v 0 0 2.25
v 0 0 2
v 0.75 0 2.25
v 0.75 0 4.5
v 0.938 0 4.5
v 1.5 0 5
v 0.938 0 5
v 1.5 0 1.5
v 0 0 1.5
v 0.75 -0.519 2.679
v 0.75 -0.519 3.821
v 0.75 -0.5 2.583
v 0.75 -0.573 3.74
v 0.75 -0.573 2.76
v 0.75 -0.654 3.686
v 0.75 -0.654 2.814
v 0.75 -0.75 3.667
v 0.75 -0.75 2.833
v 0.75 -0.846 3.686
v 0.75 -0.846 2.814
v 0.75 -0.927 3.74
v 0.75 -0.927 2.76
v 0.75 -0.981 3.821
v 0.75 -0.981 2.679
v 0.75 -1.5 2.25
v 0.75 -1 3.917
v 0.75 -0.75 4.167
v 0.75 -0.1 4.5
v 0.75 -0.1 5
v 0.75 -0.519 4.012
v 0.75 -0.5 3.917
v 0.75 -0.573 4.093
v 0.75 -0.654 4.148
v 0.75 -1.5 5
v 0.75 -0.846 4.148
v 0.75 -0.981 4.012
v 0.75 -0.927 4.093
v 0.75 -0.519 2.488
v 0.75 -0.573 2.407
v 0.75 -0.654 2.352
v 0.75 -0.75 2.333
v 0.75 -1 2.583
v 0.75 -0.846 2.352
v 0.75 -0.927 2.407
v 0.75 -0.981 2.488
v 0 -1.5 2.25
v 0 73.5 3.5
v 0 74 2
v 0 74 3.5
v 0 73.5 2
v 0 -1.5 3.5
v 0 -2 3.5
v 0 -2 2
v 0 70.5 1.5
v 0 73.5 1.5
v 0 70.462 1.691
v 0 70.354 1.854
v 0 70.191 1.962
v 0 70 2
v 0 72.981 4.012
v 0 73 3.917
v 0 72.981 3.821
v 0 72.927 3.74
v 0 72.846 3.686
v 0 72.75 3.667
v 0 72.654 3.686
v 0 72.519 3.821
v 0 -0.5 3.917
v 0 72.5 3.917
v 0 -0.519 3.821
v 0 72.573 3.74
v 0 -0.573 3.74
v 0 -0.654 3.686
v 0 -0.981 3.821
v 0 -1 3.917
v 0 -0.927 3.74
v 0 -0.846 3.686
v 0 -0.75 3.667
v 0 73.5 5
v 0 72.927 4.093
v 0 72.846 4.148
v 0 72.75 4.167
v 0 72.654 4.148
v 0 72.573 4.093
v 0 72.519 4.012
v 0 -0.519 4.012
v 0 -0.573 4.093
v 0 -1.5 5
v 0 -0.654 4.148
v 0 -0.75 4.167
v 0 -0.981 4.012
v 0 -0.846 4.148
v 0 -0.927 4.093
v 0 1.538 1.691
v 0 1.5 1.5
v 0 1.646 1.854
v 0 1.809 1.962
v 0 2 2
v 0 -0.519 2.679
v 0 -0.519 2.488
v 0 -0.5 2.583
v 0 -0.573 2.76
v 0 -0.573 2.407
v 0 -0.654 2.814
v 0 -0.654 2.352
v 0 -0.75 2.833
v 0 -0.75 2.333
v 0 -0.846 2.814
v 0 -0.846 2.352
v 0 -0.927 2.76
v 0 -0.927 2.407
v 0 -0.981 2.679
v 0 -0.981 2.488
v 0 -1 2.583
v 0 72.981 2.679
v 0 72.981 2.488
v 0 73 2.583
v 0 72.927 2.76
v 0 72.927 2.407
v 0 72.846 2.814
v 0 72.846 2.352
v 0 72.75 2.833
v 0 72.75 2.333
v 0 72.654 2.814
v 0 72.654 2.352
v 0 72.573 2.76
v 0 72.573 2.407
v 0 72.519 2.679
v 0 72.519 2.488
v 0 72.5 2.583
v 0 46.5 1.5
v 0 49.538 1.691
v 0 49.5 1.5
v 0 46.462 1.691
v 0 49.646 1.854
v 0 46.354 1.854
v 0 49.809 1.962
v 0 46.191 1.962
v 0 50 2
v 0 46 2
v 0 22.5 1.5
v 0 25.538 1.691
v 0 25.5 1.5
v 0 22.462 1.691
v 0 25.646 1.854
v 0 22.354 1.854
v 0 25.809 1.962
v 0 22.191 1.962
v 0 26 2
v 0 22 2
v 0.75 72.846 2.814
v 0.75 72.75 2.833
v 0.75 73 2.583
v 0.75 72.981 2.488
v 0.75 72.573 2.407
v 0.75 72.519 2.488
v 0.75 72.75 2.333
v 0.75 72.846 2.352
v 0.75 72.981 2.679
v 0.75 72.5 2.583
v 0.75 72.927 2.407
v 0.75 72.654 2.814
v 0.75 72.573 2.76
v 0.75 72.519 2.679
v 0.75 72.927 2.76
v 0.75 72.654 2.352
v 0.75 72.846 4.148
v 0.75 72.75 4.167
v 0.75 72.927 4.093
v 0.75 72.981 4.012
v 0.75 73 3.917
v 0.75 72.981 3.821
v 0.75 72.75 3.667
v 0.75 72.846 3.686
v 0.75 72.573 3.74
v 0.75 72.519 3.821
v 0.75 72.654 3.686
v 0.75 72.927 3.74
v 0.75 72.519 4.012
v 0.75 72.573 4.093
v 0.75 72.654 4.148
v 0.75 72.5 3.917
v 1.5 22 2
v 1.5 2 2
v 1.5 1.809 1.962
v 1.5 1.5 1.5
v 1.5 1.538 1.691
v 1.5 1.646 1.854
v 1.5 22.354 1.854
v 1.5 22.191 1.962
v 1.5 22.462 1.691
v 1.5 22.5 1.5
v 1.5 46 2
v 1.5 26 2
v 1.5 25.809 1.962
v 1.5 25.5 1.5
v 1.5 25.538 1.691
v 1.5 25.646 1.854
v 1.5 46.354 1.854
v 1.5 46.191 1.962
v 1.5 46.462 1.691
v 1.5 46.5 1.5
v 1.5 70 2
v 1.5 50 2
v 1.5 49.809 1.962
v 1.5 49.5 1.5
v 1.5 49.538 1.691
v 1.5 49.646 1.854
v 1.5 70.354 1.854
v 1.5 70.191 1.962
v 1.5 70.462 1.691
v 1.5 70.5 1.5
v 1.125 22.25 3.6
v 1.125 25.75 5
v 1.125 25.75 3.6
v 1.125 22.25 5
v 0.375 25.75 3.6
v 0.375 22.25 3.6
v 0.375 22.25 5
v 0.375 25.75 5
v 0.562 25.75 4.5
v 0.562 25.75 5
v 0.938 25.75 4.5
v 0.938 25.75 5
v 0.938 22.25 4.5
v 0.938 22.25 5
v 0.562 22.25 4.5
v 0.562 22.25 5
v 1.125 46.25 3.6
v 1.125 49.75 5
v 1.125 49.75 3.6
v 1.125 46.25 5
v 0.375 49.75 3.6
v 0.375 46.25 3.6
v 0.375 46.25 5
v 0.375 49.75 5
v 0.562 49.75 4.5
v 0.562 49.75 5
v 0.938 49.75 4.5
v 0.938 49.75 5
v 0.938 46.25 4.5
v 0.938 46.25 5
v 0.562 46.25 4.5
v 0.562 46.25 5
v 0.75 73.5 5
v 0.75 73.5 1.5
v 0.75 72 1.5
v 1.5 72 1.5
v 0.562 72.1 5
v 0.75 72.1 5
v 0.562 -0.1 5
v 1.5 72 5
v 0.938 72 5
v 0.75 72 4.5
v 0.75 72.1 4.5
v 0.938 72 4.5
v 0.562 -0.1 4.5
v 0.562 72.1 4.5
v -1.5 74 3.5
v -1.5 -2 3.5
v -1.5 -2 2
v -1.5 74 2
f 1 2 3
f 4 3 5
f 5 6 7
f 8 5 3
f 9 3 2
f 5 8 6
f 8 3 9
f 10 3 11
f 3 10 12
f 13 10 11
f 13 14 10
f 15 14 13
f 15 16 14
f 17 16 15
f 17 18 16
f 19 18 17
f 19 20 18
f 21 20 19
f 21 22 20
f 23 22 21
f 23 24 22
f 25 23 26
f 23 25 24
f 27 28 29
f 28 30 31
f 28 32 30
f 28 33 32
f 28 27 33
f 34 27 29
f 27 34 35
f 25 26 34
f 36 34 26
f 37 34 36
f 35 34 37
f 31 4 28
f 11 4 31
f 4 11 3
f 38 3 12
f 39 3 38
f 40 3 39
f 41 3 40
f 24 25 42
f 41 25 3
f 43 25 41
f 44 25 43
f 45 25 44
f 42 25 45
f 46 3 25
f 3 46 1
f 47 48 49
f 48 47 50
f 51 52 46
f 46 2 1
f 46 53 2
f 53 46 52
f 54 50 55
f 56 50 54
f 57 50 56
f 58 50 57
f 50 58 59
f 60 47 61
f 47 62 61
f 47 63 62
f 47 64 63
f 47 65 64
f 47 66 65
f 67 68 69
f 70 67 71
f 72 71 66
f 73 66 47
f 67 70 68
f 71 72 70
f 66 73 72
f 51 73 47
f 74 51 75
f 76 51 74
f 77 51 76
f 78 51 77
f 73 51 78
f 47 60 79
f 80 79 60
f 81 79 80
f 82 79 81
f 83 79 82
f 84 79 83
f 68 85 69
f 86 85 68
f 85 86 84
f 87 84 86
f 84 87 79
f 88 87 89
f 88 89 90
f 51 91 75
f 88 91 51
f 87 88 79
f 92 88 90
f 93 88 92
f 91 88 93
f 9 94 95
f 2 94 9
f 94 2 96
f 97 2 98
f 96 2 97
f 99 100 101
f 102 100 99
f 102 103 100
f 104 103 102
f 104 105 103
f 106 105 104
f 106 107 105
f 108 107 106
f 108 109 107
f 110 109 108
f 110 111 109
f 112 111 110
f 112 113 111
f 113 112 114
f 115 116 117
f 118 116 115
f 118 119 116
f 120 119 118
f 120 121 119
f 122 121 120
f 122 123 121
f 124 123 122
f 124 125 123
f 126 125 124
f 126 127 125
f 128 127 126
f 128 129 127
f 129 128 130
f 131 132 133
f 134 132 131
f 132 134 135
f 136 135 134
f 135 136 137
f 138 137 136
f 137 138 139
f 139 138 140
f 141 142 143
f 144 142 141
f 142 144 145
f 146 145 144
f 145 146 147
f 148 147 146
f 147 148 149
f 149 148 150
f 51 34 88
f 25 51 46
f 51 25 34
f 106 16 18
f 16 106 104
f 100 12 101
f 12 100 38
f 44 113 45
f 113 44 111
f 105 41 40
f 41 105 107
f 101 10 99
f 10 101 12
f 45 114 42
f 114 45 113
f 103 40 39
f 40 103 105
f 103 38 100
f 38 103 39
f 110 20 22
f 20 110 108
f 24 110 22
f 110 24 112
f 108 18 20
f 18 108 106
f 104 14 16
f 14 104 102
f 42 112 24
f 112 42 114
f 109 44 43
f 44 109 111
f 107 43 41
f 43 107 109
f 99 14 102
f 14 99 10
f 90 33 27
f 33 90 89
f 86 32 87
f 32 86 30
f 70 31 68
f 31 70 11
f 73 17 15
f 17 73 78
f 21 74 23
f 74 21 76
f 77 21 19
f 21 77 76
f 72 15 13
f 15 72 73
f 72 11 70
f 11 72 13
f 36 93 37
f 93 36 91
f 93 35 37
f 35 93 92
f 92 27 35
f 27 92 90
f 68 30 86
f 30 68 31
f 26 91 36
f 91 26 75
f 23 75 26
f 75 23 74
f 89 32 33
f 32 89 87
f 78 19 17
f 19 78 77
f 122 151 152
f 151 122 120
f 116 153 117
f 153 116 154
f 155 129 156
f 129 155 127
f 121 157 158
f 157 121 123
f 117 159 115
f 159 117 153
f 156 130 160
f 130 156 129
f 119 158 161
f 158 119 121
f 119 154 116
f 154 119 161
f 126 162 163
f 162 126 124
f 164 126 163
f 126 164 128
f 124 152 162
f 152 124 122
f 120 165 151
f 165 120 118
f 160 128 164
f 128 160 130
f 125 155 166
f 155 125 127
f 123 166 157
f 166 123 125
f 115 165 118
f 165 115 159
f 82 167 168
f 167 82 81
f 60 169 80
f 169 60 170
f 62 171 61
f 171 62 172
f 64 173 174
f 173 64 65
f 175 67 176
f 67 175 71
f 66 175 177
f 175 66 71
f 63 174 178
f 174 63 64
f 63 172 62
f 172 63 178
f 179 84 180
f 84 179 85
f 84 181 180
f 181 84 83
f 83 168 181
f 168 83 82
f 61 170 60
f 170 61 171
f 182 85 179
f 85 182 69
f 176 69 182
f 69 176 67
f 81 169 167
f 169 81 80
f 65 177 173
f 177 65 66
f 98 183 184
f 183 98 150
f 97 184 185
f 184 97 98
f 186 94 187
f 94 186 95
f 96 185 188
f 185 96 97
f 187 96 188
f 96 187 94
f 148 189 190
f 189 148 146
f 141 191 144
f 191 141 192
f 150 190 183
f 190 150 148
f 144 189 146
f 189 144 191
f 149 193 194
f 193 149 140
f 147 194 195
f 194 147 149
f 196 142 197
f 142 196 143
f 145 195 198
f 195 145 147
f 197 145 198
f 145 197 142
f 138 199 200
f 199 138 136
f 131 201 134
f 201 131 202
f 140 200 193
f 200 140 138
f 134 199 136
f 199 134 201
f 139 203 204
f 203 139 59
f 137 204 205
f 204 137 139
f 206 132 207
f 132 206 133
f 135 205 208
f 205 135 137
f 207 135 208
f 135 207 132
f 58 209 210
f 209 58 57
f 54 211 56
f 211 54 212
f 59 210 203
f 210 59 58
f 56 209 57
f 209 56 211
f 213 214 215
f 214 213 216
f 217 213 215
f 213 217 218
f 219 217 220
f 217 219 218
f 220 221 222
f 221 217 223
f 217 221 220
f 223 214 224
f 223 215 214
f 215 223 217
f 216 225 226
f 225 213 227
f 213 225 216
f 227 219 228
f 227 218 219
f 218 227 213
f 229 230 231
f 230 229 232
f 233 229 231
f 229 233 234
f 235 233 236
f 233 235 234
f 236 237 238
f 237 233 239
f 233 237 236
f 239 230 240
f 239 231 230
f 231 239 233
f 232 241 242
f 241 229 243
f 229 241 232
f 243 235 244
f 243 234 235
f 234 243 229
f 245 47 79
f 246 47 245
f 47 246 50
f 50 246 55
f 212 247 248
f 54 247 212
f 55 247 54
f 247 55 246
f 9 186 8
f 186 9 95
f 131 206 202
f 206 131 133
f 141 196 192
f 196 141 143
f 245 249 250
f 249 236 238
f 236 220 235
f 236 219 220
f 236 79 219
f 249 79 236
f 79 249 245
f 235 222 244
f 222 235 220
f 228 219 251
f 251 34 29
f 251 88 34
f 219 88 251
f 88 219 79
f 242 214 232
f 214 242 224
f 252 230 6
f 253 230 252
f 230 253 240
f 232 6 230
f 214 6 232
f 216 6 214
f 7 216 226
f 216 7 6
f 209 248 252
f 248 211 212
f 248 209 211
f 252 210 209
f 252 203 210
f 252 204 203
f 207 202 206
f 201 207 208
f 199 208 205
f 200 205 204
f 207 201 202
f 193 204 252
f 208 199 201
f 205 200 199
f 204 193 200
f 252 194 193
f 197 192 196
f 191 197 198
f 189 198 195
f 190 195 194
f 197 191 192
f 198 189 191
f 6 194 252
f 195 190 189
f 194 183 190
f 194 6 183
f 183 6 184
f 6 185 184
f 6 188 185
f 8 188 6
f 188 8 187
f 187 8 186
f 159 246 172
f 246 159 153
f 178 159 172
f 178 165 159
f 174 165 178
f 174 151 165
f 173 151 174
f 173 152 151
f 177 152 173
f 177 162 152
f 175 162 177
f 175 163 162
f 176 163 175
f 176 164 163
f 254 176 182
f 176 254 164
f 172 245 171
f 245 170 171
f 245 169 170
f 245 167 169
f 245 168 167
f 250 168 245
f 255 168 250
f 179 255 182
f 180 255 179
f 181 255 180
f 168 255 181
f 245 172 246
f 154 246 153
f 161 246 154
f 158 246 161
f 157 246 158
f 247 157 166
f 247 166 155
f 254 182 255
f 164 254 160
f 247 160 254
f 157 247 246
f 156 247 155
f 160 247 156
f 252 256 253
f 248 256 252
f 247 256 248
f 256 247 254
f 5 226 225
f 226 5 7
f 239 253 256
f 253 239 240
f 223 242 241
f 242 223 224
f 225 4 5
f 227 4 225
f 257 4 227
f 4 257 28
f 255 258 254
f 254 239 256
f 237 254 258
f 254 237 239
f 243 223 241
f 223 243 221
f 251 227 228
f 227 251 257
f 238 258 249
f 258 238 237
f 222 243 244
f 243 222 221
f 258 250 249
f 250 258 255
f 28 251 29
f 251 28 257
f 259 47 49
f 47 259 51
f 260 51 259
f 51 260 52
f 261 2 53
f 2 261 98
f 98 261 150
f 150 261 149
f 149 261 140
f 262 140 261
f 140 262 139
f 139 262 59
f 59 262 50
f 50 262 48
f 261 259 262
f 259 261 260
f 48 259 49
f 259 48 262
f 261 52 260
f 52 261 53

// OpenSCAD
use <common2.scad>

// FaceLegLeft(19);
// FaceLegRight(19);
// SideLegFront(19);
// SideLegBack(19);
// NegativeTab();
// SideBottomRail(24);
// SideFrame(24, 19, 85);
// SideTopRail(24, 19, 85);
// FaceFrame(72, 19);
 FaceBottomRail(72, 3);
// FaceTopRail(72, 3);
// FaceSlat(19);
